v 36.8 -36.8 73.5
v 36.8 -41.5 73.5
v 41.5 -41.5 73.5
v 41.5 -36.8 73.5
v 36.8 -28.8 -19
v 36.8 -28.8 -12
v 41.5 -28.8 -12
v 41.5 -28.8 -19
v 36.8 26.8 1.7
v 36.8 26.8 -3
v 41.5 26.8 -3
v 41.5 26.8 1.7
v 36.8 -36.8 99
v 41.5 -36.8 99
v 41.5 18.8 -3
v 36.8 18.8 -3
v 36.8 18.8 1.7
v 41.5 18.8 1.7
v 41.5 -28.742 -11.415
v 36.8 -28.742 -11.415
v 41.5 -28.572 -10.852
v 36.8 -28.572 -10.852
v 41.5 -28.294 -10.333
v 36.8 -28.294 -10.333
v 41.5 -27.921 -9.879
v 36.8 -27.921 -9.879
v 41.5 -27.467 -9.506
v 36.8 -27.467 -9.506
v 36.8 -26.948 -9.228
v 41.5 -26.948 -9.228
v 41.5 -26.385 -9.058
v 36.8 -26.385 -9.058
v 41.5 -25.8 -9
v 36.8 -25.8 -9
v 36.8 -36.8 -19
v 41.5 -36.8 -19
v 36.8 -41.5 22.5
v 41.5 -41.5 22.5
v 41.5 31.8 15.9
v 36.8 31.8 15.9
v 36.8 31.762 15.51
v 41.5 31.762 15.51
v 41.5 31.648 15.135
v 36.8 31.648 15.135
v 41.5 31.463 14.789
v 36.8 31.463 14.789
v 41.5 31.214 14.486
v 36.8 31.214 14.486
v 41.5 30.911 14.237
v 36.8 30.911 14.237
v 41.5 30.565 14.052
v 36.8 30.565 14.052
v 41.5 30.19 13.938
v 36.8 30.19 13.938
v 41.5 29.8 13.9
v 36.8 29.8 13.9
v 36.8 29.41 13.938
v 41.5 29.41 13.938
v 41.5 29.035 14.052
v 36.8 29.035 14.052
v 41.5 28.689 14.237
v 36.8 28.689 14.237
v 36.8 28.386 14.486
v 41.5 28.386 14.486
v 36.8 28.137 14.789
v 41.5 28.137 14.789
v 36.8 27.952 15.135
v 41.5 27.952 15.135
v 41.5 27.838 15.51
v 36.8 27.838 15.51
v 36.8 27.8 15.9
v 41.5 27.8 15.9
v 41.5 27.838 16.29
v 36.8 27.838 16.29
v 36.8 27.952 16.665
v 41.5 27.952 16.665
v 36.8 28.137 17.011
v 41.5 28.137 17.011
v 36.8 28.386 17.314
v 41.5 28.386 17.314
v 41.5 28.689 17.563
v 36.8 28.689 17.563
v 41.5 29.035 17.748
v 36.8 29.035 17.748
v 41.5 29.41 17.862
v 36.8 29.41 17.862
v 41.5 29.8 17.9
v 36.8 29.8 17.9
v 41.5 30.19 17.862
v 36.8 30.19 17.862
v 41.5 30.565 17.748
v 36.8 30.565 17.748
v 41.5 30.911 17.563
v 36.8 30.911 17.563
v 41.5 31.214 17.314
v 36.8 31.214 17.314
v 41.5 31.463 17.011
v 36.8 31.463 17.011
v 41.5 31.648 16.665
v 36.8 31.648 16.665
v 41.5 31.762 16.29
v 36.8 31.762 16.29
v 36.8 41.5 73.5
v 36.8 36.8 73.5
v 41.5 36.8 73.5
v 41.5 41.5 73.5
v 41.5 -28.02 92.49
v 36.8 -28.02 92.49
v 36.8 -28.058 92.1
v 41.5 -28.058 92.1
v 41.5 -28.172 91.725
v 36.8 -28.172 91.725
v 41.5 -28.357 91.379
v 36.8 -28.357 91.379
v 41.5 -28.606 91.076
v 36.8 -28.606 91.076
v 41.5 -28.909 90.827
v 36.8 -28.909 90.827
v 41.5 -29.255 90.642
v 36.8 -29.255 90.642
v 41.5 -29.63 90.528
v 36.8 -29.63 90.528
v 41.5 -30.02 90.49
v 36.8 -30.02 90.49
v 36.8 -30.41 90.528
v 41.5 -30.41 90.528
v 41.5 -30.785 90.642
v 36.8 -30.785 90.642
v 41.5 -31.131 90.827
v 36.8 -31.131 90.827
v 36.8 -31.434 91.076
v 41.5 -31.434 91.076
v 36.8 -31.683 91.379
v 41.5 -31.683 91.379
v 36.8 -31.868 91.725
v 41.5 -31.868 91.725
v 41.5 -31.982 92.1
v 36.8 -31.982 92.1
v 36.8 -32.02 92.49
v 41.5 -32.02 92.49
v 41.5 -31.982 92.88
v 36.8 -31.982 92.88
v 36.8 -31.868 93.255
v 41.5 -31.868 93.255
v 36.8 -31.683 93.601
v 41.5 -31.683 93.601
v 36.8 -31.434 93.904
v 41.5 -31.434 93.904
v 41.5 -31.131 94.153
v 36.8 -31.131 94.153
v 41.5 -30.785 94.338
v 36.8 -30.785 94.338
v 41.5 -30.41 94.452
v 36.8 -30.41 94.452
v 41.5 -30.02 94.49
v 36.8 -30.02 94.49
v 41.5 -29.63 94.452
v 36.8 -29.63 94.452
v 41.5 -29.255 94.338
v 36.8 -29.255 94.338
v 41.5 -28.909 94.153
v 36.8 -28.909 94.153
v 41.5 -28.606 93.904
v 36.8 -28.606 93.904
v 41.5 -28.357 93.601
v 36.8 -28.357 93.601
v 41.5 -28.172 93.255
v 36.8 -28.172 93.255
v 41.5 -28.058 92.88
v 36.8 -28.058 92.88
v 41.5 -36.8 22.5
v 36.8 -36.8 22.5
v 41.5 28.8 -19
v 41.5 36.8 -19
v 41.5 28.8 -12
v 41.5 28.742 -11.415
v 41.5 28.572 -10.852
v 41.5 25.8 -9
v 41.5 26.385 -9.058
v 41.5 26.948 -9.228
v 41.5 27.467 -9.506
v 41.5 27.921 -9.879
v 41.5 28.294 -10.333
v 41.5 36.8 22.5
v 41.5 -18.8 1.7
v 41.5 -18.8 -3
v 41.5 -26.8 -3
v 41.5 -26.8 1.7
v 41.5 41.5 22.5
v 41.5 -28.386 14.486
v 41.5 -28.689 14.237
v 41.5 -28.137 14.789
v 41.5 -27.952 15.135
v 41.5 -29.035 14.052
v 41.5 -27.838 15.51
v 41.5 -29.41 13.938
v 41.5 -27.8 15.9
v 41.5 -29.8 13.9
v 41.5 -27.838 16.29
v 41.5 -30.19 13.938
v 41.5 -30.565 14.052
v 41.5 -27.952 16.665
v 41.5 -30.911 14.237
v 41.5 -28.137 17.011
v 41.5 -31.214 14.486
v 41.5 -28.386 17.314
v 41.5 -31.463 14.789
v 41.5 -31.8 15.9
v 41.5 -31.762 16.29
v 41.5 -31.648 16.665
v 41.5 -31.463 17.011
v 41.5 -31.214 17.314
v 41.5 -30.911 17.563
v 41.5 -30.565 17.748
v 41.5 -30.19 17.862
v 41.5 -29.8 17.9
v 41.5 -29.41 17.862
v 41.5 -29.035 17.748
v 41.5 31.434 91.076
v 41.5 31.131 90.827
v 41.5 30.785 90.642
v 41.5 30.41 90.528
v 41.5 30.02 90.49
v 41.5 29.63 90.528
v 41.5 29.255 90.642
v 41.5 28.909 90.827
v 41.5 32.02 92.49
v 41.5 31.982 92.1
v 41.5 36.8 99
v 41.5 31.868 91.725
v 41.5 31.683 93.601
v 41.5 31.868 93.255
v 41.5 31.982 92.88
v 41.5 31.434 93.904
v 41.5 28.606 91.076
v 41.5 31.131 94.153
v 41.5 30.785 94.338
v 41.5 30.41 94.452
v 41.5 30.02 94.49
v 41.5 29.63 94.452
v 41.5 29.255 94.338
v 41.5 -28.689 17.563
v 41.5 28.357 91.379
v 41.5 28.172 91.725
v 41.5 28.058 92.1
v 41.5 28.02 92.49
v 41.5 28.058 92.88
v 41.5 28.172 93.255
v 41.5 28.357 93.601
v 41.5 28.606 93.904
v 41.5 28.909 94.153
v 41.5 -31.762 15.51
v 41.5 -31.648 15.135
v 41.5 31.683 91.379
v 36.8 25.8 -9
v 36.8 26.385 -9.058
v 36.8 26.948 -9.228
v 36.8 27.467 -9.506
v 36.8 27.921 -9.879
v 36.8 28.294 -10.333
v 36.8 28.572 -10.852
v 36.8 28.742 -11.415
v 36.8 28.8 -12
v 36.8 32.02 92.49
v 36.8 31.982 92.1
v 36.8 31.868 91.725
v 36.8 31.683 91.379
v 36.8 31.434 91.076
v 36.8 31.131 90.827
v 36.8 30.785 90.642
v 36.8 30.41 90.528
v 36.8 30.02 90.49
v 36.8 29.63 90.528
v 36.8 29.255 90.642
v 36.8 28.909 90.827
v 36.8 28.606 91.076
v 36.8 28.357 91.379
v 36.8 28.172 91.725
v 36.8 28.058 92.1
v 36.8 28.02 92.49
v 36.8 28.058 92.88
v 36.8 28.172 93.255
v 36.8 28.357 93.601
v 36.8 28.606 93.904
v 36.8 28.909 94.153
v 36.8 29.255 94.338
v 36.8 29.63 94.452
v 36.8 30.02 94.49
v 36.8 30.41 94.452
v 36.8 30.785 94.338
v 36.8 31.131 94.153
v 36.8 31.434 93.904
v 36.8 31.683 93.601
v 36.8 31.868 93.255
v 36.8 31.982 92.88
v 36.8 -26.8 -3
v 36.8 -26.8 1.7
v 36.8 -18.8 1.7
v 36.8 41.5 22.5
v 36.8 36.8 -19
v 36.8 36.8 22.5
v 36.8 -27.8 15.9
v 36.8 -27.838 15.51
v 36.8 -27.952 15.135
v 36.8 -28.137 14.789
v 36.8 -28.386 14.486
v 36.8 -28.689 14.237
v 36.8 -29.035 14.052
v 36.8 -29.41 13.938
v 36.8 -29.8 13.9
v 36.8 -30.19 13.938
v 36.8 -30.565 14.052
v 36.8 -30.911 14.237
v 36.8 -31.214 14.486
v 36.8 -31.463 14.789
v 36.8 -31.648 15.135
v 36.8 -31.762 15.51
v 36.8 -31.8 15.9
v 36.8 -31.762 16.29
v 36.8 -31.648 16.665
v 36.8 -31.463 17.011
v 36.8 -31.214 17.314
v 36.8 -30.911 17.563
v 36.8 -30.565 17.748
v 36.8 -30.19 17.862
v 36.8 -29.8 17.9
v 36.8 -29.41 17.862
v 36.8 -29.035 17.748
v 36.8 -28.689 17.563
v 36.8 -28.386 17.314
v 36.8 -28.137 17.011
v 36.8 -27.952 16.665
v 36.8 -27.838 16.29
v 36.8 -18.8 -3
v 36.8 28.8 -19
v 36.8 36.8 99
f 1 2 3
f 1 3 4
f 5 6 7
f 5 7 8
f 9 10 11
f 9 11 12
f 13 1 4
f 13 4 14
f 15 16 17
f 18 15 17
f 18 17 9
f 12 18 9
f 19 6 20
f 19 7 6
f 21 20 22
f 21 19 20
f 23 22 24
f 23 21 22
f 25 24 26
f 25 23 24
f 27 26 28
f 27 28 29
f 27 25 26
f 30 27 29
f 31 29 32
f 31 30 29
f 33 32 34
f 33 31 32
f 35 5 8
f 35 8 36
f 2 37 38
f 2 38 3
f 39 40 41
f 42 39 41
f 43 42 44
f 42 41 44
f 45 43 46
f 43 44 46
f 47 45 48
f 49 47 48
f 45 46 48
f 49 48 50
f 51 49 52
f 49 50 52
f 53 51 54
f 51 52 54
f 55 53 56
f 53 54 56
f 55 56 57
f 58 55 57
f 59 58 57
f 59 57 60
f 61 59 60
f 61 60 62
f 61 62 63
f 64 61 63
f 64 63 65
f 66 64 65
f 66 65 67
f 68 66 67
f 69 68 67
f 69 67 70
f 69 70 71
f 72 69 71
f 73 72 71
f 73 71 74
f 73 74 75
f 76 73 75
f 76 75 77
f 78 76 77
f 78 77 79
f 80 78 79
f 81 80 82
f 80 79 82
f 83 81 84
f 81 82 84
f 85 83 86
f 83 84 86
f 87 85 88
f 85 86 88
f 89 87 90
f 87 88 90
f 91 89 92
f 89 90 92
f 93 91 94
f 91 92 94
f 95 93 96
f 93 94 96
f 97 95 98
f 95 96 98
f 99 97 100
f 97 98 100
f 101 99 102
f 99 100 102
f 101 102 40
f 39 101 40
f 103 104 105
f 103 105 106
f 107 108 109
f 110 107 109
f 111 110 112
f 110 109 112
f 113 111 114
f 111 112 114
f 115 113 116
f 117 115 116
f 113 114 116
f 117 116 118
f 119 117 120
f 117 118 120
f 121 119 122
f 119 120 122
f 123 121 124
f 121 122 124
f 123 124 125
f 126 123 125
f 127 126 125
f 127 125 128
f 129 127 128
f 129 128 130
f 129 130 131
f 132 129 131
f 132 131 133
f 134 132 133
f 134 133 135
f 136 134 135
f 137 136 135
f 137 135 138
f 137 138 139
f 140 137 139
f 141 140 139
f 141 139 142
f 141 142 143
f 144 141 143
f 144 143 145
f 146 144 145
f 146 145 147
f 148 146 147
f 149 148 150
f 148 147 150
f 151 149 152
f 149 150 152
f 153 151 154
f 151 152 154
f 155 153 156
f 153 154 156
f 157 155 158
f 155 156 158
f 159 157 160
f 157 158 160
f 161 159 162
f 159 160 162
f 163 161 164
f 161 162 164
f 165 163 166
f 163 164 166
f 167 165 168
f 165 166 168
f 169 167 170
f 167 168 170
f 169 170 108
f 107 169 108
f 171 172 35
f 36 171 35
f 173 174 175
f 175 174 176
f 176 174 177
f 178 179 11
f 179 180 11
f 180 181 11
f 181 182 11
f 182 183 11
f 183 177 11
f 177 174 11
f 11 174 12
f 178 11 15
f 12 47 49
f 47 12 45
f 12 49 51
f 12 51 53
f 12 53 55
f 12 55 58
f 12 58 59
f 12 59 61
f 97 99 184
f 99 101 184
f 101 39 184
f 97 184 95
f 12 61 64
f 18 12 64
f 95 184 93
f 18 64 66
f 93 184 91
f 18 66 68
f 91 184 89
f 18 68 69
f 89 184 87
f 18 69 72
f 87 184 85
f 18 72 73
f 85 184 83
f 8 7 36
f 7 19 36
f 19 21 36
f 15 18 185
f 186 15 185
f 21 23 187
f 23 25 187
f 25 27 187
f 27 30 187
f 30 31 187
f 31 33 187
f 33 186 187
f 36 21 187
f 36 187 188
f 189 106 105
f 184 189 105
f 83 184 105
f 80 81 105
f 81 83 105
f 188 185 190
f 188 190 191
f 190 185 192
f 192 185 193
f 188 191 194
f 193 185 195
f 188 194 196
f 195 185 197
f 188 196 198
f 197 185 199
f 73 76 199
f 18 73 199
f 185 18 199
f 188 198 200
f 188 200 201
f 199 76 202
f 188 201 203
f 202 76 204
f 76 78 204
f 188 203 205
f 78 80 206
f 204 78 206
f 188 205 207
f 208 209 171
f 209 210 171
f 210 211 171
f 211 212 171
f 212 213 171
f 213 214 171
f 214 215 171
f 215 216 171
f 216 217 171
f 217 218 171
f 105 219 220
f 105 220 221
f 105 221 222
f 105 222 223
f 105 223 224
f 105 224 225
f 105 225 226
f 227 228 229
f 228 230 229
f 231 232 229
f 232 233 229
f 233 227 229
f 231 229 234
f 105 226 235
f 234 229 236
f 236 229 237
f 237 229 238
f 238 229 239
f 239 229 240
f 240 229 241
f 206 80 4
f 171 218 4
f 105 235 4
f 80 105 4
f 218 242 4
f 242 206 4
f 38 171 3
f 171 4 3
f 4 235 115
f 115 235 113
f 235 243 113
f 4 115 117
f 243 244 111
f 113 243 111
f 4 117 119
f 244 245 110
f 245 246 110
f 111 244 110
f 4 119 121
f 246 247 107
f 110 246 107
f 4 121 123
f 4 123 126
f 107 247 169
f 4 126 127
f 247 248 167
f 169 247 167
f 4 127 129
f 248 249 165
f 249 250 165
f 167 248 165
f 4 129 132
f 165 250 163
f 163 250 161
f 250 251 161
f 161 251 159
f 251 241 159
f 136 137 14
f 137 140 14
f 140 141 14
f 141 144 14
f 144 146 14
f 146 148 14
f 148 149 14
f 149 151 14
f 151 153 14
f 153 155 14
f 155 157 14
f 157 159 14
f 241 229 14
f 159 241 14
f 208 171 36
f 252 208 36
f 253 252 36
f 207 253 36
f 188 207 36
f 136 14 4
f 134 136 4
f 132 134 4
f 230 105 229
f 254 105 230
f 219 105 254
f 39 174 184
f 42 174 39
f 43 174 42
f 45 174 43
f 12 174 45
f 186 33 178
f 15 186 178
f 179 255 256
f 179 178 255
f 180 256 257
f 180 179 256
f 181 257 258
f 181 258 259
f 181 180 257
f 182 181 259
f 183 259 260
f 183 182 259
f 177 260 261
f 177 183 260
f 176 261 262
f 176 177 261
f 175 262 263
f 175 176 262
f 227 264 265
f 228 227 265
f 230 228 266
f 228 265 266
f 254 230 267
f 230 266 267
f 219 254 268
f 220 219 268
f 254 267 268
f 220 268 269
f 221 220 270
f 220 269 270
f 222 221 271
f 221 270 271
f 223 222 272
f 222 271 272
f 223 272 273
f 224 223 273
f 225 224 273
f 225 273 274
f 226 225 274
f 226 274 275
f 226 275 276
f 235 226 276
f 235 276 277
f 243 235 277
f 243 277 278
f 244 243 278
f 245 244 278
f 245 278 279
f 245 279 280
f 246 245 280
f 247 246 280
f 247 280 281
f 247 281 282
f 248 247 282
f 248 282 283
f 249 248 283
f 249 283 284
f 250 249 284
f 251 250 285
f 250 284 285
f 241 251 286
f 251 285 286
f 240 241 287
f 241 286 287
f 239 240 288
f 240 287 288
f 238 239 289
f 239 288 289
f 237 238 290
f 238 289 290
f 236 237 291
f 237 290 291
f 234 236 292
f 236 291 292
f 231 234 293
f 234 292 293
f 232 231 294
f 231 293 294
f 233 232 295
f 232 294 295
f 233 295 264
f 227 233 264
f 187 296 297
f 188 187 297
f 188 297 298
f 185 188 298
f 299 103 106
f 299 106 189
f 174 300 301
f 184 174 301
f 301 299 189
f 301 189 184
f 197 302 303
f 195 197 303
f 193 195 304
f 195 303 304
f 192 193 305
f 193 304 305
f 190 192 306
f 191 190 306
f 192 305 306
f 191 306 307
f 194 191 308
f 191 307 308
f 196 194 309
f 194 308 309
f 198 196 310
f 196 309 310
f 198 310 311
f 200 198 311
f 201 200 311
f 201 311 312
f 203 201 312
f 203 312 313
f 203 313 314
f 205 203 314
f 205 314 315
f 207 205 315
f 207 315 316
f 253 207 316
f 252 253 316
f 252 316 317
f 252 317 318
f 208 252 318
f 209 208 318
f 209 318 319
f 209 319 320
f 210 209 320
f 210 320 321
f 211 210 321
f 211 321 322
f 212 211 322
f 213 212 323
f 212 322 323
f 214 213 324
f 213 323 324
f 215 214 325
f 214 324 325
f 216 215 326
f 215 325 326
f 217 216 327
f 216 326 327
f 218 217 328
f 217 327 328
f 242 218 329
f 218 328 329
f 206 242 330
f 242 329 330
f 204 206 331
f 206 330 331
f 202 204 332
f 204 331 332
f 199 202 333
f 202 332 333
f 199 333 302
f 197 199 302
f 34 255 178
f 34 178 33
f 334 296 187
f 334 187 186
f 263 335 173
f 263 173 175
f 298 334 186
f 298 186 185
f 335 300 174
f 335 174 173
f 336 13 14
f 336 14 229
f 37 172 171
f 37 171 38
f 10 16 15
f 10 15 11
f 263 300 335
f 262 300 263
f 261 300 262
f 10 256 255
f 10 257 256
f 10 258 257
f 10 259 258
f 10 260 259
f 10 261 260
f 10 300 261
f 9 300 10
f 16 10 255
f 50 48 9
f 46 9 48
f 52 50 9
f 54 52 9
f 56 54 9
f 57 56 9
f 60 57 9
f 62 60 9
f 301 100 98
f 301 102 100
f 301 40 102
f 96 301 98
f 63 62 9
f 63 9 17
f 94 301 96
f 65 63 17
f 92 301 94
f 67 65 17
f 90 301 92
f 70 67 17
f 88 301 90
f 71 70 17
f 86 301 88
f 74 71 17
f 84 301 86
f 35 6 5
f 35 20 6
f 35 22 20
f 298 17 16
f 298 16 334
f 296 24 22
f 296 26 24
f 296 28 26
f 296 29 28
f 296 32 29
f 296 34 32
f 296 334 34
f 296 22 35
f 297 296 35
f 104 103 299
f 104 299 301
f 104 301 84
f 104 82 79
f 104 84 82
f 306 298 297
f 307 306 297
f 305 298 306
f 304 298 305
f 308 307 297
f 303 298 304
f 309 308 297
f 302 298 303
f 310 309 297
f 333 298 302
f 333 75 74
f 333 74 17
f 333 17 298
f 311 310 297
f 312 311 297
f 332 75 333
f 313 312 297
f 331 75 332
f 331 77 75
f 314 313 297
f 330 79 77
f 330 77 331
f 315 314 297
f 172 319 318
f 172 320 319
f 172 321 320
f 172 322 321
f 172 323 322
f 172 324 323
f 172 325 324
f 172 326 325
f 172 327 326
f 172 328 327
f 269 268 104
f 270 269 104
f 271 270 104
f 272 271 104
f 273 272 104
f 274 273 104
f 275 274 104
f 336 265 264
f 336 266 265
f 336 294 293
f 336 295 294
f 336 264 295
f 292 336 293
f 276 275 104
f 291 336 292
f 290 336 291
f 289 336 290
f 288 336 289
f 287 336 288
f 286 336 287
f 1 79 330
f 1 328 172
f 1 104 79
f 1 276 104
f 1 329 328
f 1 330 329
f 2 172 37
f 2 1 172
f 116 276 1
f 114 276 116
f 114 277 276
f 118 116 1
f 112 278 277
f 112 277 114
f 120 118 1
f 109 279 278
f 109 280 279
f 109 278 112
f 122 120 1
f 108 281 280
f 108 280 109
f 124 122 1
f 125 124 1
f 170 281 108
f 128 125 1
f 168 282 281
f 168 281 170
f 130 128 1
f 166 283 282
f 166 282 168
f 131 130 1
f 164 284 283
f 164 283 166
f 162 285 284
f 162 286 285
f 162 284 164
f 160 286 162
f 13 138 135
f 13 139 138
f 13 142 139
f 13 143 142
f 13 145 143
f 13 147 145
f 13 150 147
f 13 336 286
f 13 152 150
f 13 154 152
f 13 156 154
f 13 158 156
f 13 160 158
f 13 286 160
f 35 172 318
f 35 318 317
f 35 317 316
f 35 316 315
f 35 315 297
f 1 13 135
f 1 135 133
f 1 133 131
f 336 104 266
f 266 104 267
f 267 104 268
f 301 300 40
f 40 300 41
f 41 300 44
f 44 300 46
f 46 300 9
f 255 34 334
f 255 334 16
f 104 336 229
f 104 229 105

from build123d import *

# Parameters (mm, degrees)
SKETCH015_W             = 8
SKETCH015_H             = 4.7
PAD011_DEPTH            = 4.7
FILLET004_R             = 3
SKETCH018_R             = 2
POCKET_DEPTH            = 4.701
BODY011_PLACEMENT_ANGLE = 90


with BuildPart() as part:
    # Sketch015 → Pad011 (new body)
    with BuildSketch(Plane.XZ):
        Polygon((-41.5, -25.5), (-41.5, 25.5), (-36.8, 25.5), (-36.8, 51), (36.8, 51), (36.8, 25.5), (41.5, 25.5), (41.5, -25.5), (36.8, -25.5), (36.8, -51), (36.8, -67), (28.8, -67), (28.8, -57), (-28.8, -57), (-28.8, -67), (-36.8, -67), (-36.8, -51), (-36.8, -25.5), align=None)
        with Locations((-22.8, -48.65)):
            Rectangle(SKETCH015_W, SKETCH015_H, mode=Mode.SUBTRACT)
        with Locations((22.8, -48.65)):
            Rectangle(SKETCH015_W, SKETCH015_H, mode=Mode.SUBTRACT)
    extrude(amount=PAD011_DEPTH)

    # Fillet004
    fillet004_edges = [part.edges().sort_by_distance(p)[0] for p in [
        (28.8, -2.35, -57),
        (-28.8, -2.35, -57),
    ]]
    fillet(fillet004_edges, radius=FILLET004_R)

    # Sketch018 (on Face2 of Fillet004) → Pocket (cut, through all)
    with BuildSketch(Plane(origin=(0, 0, 0), x_dir=(1, 0, 0), z_dir=(0, 1, 0))):
        with Locations((30.02, -44.49)):
            Circle(SKETCH018_R)
        with Locations((-30.02, -44.49)):
            Circle(SKETCH018_R)
        with Locations((29.8, 32.1)):
            Circle(SKETCH018_R)
        with Locations((-29.8, 32.1)):
            Circle(SKETCH018_R)
    extrude(amount=-POCKET_DEPTH, mode=Mode.SUBTRACT)


with BuildPart() as part_1:
    # Body011 placement: moved
    add(part.part.moved(Location((-41.5, 0, 48))).rotate(Axis((-41.5, 0, 48), (0, 0, 1)), BODY011_PLACEMENT_ANGLE))


with BuildPart() as part_2:
    # Clone placement: moved
    add(part_1.part.moved(Location((2.5, 0, 0))))


with BuildPart() as part_3:
    # Body012 placement: moved
    add(part_2.part.moved(Location((75.8, 0, 0))))


solid = part_3.part
